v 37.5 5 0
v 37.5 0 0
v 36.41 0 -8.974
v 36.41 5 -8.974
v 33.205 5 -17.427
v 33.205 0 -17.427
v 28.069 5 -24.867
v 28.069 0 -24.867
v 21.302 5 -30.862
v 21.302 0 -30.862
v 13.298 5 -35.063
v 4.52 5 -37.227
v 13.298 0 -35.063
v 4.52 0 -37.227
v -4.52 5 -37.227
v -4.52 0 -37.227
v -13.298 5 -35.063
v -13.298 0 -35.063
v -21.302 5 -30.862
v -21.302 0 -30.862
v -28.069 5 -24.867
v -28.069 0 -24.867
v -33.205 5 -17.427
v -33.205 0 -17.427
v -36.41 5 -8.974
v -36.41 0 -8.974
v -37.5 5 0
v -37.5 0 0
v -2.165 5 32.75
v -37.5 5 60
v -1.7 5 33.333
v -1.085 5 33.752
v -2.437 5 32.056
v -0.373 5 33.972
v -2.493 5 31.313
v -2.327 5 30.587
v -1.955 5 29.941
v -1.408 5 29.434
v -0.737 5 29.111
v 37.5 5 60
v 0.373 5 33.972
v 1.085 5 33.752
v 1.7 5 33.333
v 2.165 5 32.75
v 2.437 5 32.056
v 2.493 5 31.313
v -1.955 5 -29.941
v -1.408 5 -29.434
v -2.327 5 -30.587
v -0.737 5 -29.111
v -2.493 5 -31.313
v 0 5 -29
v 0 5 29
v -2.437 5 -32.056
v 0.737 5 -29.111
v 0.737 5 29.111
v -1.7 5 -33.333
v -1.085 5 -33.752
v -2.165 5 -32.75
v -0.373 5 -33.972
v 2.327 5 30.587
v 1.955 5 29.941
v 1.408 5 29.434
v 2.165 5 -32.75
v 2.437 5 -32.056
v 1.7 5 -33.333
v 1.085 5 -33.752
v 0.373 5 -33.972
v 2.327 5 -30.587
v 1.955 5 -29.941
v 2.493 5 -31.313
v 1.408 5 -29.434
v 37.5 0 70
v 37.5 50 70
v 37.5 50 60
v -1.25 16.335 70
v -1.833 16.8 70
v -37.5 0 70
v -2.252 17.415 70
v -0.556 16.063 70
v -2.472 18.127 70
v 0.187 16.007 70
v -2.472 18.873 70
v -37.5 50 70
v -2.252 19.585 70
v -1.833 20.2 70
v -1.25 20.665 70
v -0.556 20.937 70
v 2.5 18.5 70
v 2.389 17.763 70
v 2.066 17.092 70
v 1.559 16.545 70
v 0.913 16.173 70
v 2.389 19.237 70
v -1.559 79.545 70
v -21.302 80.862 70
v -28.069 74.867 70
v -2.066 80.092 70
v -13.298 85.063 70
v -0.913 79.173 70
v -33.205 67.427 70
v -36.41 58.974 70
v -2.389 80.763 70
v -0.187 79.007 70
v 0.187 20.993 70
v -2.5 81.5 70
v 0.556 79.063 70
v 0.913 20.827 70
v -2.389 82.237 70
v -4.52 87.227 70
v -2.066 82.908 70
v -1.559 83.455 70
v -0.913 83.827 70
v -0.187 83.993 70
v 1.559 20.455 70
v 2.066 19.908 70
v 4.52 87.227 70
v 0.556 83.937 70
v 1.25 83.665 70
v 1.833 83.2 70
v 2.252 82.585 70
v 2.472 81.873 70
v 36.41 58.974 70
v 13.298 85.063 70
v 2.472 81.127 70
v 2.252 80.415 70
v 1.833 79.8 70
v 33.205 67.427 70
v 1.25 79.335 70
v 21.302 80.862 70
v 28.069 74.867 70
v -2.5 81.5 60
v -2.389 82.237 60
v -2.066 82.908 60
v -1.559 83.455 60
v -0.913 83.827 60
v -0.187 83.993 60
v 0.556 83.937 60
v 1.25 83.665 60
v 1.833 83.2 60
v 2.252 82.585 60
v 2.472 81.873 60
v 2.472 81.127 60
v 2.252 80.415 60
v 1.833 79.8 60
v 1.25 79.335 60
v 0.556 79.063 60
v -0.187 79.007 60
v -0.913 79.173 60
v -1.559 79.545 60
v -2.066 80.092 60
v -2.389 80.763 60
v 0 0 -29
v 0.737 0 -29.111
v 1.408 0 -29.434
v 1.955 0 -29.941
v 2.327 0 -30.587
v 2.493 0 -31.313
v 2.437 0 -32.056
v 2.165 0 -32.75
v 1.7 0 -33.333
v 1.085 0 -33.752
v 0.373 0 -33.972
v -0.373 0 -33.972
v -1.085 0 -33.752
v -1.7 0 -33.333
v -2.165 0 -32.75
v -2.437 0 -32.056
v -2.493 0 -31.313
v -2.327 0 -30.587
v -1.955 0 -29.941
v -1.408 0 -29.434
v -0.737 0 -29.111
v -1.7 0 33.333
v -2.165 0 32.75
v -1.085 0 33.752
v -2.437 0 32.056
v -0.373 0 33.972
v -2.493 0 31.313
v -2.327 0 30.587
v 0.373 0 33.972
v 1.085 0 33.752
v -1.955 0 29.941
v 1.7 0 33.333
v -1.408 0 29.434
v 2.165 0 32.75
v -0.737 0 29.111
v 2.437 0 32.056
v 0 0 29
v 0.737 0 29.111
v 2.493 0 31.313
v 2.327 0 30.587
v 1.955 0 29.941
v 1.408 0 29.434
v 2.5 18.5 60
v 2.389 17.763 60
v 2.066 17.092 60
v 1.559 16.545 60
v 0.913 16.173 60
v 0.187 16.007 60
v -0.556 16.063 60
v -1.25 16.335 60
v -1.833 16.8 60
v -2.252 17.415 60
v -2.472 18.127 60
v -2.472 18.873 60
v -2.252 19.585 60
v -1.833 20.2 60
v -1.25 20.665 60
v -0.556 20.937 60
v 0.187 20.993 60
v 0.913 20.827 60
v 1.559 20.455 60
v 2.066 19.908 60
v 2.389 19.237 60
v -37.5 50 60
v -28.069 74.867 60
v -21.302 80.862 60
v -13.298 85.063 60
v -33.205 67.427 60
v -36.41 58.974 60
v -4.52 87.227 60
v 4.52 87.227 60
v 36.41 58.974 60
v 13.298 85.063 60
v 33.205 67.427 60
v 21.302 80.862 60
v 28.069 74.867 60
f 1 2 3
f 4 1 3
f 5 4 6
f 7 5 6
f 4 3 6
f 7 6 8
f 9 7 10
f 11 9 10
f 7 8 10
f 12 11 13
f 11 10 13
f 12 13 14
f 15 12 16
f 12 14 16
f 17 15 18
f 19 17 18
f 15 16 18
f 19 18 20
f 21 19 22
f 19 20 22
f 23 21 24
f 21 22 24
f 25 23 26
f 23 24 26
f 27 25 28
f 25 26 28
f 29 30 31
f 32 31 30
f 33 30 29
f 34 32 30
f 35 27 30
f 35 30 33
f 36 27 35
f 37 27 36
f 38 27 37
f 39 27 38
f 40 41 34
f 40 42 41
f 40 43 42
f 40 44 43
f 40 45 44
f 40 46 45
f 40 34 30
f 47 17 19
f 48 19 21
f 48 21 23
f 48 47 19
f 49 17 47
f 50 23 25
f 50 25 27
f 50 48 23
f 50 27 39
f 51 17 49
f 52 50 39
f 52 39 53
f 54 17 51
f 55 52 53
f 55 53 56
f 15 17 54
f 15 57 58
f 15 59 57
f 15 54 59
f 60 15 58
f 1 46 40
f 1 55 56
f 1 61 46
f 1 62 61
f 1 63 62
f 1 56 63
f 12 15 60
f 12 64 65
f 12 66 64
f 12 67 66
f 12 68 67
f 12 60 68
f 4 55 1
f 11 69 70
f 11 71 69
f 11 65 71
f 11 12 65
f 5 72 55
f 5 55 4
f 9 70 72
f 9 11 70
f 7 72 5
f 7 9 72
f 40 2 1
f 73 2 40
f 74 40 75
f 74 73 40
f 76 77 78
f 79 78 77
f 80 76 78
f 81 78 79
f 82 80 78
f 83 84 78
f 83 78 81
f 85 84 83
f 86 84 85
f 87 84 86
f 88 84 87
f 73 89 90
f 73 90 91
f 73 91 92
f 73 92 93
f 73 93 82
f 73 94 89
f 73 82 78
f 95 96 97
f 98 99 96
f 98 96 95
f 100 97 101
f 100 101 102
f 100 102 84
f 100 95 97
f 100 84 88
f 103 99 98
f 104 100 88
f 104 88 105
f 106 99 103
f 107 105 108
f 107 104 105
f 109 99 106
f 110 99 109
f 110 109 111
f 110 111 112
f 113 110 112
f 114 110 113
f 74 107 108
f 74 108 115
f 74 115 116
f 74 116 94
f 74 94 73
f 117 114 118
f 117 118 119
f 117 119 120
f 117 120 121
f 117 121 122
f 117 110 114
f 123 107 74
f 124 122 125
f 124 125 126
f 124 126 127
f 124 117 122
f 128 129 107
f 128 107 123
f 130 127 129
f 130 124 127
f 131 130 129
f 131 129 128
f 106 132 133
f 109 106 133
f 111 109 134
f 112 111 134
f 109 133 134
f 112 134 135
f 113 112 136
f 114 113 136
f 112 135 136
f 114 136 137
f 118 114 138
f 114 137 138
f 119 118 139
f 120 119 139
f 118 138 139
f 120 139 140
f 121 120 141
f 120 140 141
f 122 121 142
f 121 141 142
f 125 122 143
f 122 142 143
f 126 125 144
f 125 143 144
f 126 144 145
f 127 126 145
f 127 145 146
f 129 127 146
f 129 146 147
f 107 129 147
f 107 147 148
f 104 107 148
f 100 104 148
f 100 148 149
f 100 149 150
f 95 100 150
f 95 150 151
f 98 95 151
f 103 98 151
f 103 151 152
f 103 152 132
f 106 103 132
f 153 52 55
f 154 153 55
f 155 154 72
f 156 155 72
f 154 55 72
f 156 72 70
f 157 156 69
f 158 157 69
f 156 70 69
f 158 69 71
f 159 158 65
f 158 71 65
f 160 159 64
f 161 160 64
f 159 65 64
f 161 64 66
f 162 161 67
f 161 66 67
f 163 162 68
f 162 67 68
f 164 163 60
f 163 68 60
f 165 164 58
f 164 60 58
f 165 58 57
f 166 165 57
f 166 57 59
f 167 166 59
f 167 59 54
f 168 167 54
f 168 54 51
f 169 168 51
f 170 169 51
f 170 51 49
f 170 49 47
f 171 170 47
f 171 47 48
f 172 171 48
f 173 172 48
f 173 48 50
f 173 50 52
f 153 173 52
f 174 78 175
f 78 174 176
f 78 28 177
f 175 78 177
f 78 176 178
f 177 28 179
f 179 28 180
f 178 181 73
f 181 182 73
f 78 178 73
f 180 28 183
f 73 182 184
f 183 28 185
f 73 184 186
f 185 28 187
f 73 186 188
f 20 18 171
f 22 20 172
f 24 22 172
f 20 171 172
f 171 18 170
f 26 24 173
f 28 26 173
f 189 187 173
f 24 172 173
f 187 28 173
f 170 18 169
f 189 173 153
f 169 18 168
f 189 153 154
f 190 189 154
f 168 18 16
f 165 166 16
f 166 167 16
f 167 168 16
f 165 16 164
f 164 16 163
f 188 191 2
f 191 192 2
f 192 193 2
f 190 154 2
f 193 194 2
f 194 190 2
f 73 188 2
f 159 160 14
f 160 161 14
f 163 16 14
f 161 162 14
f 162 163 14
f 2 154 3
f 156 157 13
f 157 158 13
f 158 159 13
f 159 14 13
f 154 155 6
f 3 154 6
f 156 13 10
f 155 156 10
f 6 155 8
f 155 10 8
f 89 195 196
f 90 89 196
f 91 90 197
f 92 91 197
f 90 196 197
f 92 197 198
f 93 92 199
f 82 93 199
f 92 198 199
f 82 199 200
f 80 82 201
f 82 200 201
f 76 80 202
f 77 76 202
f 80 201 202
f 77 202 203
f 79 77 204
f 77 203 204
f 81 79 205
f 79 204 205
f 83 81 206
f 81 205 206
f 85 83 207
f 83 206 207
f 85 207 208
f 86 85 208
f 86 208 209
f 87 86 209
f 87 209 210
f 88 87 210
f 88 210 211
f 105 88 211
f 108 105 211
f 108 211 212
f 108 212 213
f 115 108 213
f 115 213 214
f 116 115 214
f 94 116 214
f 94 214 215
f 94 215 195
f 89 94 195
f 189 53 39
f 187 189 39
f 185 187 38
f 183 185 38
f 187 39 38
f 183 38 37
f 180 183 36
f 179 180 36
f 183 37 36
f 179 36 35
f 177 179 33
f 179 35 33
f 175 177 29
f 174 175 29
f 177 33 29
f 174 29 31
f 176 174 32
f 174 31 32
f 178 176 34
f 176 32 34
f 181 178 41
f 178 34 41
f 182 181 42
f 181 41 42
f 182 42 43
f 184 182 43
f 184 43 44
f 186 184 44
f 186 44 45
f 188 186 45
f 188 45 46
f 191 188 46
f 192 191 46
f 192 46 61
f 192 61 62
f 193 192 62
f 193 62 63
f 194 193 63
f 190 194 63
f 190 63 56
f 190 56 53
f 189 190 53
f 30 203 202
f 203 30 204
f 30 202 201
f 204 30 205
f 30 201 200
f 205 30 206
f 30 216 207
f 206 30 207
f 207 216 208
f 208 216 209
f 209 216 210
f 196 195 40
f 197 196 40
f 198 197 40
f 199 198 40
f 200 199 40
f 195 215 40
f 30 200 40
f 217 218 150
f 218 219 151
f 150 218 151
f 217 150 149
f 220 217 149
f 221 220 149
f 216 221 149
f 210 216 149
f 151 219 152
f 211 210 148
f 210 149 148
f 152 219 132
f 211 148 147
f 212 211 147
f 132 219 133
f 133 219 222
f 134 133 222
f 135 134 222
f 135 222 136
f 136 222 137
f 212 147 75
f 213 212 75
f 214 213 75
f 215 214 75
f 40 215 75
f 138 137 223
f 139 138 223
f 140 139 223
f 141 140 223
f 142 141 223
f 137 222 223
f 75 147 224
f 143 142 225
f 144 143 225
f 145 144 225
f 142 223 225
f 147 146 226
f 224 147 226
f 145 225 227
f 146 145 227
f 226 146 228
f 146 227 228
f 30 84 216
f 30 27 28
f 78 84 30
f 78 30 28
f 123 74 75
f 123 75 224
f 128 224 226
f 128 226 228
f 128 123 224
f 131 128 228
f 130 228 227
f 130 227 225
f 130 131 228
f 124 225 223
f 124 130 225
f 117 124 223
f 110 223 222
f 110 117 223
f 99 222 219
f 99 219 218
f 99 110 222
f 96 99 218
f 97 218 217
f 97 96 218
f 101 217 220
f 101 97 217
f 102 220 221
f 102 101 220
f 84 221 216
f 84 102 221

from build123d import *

# Parameters (mm, degrees)
EXTRUDE_1_DEPTH     = 5
SKETCH_18_W         = 75
SKETCH_18_H         = 10
EXTRUDE_2_DEPTH     = 30
SKETCH_19_R         = 2.5
CUT_EXTRUDE_3_DEPTH = 85.889634232
EXTRUDE_3_DEPTH     = 10
SKETCH_21_R         = 2.5
CUT_EXTRUDE_4_DEPTH = 137.267200749


with BuildPart() as part:
    # ｽｹｯﾁ1 → ﾎﾞｽ - 押し出し1 (new body)
    with BuildSketch(Plane(origin=(0, 0, 0), x_dir=(1, 0, 0), z_dir=(0, 1, 0))):
        with BuildLine():
            Line((-37.5, 0), (-37.5, -70))
            Line((-37.5, -70), (37.5, -70))
            Line((37.5, -70), (37.5, 0))
            ThreePointArc((37.5, 0), (0, 37.5), (-37.5, 0))
        make_face()
    extrude(amount=EXTRUDE_1_DEPTH)

    # ｽｹｯﾁ18 → ﾎﾞｽ - 押し出し2 (add)
    with BuildSketch(Plane(origin=(0, 5, 0), x_dir=(1, 0, 0), z_dir=(0, 1, 0))):
        with Locations((0, -65)):
            Rectangle(SKETCH_18_W, SKETCH_18_H)
    extrude(amount=EXTRUDE_2_DEPTH)

    # ｽｹｯﾁ19 → ｶｯﾄ - 押し出し3 (cut, through all)
    with BuildSketch(Plane(origin=(0, 5, 0), x_dir=(1, 0, 0), z_dir=(0, 1, 0))):
        with Locations(Location((0, 31.5, 0), (0, 0, 270))):
            Circle(SKETCH_19_R)
        with Locations(Location((0, -31.5, 0), (0, 0, 90))):
            Circle(SKETCH_19_R)
    extrude(amount=-CUT_EXTRUDE_3_DEPTH, mode=Mode.SUBTRACT)

    # ｽｹｯﾁ20 → ﾎﾞｽ - 押し出し3 (add)
    with BuildSketch(Plane.XY.offset(70)):
        with BuildLine():
            Line((-37.5, 50), (-37.5, 35))
            Line((-37.5, 35), (37.5, 35))
            Line((37.5, 35), (37.5, 50))
            ThreePointArc((37.5, 50), (0, 87.5), (-37.5, 50))
        make_face()
    extrude(amount=-EXTRUDE_3_DEPTH)

    # ｽｹｯﾁ21 → ｶｯﾄ - 押し出し4 (cut, through all)
    with BuildSketch(Plane(origin=(0, 0, 60), x_dir=(-1, 0, 0), z_dir=(0, 0, -1))):
        with Locations((0, 81.5)):
            Circle(SKETCH_21_R)
        with Locations(Location((0, 18.5, 0), (0, 0, 180))):
            Circle(SKETCH_21_R)
    extrude(amount=-CUT_EXTRUDE_4_DEPTH, mode=Mode.SUBTRACT)


solid = part.part
